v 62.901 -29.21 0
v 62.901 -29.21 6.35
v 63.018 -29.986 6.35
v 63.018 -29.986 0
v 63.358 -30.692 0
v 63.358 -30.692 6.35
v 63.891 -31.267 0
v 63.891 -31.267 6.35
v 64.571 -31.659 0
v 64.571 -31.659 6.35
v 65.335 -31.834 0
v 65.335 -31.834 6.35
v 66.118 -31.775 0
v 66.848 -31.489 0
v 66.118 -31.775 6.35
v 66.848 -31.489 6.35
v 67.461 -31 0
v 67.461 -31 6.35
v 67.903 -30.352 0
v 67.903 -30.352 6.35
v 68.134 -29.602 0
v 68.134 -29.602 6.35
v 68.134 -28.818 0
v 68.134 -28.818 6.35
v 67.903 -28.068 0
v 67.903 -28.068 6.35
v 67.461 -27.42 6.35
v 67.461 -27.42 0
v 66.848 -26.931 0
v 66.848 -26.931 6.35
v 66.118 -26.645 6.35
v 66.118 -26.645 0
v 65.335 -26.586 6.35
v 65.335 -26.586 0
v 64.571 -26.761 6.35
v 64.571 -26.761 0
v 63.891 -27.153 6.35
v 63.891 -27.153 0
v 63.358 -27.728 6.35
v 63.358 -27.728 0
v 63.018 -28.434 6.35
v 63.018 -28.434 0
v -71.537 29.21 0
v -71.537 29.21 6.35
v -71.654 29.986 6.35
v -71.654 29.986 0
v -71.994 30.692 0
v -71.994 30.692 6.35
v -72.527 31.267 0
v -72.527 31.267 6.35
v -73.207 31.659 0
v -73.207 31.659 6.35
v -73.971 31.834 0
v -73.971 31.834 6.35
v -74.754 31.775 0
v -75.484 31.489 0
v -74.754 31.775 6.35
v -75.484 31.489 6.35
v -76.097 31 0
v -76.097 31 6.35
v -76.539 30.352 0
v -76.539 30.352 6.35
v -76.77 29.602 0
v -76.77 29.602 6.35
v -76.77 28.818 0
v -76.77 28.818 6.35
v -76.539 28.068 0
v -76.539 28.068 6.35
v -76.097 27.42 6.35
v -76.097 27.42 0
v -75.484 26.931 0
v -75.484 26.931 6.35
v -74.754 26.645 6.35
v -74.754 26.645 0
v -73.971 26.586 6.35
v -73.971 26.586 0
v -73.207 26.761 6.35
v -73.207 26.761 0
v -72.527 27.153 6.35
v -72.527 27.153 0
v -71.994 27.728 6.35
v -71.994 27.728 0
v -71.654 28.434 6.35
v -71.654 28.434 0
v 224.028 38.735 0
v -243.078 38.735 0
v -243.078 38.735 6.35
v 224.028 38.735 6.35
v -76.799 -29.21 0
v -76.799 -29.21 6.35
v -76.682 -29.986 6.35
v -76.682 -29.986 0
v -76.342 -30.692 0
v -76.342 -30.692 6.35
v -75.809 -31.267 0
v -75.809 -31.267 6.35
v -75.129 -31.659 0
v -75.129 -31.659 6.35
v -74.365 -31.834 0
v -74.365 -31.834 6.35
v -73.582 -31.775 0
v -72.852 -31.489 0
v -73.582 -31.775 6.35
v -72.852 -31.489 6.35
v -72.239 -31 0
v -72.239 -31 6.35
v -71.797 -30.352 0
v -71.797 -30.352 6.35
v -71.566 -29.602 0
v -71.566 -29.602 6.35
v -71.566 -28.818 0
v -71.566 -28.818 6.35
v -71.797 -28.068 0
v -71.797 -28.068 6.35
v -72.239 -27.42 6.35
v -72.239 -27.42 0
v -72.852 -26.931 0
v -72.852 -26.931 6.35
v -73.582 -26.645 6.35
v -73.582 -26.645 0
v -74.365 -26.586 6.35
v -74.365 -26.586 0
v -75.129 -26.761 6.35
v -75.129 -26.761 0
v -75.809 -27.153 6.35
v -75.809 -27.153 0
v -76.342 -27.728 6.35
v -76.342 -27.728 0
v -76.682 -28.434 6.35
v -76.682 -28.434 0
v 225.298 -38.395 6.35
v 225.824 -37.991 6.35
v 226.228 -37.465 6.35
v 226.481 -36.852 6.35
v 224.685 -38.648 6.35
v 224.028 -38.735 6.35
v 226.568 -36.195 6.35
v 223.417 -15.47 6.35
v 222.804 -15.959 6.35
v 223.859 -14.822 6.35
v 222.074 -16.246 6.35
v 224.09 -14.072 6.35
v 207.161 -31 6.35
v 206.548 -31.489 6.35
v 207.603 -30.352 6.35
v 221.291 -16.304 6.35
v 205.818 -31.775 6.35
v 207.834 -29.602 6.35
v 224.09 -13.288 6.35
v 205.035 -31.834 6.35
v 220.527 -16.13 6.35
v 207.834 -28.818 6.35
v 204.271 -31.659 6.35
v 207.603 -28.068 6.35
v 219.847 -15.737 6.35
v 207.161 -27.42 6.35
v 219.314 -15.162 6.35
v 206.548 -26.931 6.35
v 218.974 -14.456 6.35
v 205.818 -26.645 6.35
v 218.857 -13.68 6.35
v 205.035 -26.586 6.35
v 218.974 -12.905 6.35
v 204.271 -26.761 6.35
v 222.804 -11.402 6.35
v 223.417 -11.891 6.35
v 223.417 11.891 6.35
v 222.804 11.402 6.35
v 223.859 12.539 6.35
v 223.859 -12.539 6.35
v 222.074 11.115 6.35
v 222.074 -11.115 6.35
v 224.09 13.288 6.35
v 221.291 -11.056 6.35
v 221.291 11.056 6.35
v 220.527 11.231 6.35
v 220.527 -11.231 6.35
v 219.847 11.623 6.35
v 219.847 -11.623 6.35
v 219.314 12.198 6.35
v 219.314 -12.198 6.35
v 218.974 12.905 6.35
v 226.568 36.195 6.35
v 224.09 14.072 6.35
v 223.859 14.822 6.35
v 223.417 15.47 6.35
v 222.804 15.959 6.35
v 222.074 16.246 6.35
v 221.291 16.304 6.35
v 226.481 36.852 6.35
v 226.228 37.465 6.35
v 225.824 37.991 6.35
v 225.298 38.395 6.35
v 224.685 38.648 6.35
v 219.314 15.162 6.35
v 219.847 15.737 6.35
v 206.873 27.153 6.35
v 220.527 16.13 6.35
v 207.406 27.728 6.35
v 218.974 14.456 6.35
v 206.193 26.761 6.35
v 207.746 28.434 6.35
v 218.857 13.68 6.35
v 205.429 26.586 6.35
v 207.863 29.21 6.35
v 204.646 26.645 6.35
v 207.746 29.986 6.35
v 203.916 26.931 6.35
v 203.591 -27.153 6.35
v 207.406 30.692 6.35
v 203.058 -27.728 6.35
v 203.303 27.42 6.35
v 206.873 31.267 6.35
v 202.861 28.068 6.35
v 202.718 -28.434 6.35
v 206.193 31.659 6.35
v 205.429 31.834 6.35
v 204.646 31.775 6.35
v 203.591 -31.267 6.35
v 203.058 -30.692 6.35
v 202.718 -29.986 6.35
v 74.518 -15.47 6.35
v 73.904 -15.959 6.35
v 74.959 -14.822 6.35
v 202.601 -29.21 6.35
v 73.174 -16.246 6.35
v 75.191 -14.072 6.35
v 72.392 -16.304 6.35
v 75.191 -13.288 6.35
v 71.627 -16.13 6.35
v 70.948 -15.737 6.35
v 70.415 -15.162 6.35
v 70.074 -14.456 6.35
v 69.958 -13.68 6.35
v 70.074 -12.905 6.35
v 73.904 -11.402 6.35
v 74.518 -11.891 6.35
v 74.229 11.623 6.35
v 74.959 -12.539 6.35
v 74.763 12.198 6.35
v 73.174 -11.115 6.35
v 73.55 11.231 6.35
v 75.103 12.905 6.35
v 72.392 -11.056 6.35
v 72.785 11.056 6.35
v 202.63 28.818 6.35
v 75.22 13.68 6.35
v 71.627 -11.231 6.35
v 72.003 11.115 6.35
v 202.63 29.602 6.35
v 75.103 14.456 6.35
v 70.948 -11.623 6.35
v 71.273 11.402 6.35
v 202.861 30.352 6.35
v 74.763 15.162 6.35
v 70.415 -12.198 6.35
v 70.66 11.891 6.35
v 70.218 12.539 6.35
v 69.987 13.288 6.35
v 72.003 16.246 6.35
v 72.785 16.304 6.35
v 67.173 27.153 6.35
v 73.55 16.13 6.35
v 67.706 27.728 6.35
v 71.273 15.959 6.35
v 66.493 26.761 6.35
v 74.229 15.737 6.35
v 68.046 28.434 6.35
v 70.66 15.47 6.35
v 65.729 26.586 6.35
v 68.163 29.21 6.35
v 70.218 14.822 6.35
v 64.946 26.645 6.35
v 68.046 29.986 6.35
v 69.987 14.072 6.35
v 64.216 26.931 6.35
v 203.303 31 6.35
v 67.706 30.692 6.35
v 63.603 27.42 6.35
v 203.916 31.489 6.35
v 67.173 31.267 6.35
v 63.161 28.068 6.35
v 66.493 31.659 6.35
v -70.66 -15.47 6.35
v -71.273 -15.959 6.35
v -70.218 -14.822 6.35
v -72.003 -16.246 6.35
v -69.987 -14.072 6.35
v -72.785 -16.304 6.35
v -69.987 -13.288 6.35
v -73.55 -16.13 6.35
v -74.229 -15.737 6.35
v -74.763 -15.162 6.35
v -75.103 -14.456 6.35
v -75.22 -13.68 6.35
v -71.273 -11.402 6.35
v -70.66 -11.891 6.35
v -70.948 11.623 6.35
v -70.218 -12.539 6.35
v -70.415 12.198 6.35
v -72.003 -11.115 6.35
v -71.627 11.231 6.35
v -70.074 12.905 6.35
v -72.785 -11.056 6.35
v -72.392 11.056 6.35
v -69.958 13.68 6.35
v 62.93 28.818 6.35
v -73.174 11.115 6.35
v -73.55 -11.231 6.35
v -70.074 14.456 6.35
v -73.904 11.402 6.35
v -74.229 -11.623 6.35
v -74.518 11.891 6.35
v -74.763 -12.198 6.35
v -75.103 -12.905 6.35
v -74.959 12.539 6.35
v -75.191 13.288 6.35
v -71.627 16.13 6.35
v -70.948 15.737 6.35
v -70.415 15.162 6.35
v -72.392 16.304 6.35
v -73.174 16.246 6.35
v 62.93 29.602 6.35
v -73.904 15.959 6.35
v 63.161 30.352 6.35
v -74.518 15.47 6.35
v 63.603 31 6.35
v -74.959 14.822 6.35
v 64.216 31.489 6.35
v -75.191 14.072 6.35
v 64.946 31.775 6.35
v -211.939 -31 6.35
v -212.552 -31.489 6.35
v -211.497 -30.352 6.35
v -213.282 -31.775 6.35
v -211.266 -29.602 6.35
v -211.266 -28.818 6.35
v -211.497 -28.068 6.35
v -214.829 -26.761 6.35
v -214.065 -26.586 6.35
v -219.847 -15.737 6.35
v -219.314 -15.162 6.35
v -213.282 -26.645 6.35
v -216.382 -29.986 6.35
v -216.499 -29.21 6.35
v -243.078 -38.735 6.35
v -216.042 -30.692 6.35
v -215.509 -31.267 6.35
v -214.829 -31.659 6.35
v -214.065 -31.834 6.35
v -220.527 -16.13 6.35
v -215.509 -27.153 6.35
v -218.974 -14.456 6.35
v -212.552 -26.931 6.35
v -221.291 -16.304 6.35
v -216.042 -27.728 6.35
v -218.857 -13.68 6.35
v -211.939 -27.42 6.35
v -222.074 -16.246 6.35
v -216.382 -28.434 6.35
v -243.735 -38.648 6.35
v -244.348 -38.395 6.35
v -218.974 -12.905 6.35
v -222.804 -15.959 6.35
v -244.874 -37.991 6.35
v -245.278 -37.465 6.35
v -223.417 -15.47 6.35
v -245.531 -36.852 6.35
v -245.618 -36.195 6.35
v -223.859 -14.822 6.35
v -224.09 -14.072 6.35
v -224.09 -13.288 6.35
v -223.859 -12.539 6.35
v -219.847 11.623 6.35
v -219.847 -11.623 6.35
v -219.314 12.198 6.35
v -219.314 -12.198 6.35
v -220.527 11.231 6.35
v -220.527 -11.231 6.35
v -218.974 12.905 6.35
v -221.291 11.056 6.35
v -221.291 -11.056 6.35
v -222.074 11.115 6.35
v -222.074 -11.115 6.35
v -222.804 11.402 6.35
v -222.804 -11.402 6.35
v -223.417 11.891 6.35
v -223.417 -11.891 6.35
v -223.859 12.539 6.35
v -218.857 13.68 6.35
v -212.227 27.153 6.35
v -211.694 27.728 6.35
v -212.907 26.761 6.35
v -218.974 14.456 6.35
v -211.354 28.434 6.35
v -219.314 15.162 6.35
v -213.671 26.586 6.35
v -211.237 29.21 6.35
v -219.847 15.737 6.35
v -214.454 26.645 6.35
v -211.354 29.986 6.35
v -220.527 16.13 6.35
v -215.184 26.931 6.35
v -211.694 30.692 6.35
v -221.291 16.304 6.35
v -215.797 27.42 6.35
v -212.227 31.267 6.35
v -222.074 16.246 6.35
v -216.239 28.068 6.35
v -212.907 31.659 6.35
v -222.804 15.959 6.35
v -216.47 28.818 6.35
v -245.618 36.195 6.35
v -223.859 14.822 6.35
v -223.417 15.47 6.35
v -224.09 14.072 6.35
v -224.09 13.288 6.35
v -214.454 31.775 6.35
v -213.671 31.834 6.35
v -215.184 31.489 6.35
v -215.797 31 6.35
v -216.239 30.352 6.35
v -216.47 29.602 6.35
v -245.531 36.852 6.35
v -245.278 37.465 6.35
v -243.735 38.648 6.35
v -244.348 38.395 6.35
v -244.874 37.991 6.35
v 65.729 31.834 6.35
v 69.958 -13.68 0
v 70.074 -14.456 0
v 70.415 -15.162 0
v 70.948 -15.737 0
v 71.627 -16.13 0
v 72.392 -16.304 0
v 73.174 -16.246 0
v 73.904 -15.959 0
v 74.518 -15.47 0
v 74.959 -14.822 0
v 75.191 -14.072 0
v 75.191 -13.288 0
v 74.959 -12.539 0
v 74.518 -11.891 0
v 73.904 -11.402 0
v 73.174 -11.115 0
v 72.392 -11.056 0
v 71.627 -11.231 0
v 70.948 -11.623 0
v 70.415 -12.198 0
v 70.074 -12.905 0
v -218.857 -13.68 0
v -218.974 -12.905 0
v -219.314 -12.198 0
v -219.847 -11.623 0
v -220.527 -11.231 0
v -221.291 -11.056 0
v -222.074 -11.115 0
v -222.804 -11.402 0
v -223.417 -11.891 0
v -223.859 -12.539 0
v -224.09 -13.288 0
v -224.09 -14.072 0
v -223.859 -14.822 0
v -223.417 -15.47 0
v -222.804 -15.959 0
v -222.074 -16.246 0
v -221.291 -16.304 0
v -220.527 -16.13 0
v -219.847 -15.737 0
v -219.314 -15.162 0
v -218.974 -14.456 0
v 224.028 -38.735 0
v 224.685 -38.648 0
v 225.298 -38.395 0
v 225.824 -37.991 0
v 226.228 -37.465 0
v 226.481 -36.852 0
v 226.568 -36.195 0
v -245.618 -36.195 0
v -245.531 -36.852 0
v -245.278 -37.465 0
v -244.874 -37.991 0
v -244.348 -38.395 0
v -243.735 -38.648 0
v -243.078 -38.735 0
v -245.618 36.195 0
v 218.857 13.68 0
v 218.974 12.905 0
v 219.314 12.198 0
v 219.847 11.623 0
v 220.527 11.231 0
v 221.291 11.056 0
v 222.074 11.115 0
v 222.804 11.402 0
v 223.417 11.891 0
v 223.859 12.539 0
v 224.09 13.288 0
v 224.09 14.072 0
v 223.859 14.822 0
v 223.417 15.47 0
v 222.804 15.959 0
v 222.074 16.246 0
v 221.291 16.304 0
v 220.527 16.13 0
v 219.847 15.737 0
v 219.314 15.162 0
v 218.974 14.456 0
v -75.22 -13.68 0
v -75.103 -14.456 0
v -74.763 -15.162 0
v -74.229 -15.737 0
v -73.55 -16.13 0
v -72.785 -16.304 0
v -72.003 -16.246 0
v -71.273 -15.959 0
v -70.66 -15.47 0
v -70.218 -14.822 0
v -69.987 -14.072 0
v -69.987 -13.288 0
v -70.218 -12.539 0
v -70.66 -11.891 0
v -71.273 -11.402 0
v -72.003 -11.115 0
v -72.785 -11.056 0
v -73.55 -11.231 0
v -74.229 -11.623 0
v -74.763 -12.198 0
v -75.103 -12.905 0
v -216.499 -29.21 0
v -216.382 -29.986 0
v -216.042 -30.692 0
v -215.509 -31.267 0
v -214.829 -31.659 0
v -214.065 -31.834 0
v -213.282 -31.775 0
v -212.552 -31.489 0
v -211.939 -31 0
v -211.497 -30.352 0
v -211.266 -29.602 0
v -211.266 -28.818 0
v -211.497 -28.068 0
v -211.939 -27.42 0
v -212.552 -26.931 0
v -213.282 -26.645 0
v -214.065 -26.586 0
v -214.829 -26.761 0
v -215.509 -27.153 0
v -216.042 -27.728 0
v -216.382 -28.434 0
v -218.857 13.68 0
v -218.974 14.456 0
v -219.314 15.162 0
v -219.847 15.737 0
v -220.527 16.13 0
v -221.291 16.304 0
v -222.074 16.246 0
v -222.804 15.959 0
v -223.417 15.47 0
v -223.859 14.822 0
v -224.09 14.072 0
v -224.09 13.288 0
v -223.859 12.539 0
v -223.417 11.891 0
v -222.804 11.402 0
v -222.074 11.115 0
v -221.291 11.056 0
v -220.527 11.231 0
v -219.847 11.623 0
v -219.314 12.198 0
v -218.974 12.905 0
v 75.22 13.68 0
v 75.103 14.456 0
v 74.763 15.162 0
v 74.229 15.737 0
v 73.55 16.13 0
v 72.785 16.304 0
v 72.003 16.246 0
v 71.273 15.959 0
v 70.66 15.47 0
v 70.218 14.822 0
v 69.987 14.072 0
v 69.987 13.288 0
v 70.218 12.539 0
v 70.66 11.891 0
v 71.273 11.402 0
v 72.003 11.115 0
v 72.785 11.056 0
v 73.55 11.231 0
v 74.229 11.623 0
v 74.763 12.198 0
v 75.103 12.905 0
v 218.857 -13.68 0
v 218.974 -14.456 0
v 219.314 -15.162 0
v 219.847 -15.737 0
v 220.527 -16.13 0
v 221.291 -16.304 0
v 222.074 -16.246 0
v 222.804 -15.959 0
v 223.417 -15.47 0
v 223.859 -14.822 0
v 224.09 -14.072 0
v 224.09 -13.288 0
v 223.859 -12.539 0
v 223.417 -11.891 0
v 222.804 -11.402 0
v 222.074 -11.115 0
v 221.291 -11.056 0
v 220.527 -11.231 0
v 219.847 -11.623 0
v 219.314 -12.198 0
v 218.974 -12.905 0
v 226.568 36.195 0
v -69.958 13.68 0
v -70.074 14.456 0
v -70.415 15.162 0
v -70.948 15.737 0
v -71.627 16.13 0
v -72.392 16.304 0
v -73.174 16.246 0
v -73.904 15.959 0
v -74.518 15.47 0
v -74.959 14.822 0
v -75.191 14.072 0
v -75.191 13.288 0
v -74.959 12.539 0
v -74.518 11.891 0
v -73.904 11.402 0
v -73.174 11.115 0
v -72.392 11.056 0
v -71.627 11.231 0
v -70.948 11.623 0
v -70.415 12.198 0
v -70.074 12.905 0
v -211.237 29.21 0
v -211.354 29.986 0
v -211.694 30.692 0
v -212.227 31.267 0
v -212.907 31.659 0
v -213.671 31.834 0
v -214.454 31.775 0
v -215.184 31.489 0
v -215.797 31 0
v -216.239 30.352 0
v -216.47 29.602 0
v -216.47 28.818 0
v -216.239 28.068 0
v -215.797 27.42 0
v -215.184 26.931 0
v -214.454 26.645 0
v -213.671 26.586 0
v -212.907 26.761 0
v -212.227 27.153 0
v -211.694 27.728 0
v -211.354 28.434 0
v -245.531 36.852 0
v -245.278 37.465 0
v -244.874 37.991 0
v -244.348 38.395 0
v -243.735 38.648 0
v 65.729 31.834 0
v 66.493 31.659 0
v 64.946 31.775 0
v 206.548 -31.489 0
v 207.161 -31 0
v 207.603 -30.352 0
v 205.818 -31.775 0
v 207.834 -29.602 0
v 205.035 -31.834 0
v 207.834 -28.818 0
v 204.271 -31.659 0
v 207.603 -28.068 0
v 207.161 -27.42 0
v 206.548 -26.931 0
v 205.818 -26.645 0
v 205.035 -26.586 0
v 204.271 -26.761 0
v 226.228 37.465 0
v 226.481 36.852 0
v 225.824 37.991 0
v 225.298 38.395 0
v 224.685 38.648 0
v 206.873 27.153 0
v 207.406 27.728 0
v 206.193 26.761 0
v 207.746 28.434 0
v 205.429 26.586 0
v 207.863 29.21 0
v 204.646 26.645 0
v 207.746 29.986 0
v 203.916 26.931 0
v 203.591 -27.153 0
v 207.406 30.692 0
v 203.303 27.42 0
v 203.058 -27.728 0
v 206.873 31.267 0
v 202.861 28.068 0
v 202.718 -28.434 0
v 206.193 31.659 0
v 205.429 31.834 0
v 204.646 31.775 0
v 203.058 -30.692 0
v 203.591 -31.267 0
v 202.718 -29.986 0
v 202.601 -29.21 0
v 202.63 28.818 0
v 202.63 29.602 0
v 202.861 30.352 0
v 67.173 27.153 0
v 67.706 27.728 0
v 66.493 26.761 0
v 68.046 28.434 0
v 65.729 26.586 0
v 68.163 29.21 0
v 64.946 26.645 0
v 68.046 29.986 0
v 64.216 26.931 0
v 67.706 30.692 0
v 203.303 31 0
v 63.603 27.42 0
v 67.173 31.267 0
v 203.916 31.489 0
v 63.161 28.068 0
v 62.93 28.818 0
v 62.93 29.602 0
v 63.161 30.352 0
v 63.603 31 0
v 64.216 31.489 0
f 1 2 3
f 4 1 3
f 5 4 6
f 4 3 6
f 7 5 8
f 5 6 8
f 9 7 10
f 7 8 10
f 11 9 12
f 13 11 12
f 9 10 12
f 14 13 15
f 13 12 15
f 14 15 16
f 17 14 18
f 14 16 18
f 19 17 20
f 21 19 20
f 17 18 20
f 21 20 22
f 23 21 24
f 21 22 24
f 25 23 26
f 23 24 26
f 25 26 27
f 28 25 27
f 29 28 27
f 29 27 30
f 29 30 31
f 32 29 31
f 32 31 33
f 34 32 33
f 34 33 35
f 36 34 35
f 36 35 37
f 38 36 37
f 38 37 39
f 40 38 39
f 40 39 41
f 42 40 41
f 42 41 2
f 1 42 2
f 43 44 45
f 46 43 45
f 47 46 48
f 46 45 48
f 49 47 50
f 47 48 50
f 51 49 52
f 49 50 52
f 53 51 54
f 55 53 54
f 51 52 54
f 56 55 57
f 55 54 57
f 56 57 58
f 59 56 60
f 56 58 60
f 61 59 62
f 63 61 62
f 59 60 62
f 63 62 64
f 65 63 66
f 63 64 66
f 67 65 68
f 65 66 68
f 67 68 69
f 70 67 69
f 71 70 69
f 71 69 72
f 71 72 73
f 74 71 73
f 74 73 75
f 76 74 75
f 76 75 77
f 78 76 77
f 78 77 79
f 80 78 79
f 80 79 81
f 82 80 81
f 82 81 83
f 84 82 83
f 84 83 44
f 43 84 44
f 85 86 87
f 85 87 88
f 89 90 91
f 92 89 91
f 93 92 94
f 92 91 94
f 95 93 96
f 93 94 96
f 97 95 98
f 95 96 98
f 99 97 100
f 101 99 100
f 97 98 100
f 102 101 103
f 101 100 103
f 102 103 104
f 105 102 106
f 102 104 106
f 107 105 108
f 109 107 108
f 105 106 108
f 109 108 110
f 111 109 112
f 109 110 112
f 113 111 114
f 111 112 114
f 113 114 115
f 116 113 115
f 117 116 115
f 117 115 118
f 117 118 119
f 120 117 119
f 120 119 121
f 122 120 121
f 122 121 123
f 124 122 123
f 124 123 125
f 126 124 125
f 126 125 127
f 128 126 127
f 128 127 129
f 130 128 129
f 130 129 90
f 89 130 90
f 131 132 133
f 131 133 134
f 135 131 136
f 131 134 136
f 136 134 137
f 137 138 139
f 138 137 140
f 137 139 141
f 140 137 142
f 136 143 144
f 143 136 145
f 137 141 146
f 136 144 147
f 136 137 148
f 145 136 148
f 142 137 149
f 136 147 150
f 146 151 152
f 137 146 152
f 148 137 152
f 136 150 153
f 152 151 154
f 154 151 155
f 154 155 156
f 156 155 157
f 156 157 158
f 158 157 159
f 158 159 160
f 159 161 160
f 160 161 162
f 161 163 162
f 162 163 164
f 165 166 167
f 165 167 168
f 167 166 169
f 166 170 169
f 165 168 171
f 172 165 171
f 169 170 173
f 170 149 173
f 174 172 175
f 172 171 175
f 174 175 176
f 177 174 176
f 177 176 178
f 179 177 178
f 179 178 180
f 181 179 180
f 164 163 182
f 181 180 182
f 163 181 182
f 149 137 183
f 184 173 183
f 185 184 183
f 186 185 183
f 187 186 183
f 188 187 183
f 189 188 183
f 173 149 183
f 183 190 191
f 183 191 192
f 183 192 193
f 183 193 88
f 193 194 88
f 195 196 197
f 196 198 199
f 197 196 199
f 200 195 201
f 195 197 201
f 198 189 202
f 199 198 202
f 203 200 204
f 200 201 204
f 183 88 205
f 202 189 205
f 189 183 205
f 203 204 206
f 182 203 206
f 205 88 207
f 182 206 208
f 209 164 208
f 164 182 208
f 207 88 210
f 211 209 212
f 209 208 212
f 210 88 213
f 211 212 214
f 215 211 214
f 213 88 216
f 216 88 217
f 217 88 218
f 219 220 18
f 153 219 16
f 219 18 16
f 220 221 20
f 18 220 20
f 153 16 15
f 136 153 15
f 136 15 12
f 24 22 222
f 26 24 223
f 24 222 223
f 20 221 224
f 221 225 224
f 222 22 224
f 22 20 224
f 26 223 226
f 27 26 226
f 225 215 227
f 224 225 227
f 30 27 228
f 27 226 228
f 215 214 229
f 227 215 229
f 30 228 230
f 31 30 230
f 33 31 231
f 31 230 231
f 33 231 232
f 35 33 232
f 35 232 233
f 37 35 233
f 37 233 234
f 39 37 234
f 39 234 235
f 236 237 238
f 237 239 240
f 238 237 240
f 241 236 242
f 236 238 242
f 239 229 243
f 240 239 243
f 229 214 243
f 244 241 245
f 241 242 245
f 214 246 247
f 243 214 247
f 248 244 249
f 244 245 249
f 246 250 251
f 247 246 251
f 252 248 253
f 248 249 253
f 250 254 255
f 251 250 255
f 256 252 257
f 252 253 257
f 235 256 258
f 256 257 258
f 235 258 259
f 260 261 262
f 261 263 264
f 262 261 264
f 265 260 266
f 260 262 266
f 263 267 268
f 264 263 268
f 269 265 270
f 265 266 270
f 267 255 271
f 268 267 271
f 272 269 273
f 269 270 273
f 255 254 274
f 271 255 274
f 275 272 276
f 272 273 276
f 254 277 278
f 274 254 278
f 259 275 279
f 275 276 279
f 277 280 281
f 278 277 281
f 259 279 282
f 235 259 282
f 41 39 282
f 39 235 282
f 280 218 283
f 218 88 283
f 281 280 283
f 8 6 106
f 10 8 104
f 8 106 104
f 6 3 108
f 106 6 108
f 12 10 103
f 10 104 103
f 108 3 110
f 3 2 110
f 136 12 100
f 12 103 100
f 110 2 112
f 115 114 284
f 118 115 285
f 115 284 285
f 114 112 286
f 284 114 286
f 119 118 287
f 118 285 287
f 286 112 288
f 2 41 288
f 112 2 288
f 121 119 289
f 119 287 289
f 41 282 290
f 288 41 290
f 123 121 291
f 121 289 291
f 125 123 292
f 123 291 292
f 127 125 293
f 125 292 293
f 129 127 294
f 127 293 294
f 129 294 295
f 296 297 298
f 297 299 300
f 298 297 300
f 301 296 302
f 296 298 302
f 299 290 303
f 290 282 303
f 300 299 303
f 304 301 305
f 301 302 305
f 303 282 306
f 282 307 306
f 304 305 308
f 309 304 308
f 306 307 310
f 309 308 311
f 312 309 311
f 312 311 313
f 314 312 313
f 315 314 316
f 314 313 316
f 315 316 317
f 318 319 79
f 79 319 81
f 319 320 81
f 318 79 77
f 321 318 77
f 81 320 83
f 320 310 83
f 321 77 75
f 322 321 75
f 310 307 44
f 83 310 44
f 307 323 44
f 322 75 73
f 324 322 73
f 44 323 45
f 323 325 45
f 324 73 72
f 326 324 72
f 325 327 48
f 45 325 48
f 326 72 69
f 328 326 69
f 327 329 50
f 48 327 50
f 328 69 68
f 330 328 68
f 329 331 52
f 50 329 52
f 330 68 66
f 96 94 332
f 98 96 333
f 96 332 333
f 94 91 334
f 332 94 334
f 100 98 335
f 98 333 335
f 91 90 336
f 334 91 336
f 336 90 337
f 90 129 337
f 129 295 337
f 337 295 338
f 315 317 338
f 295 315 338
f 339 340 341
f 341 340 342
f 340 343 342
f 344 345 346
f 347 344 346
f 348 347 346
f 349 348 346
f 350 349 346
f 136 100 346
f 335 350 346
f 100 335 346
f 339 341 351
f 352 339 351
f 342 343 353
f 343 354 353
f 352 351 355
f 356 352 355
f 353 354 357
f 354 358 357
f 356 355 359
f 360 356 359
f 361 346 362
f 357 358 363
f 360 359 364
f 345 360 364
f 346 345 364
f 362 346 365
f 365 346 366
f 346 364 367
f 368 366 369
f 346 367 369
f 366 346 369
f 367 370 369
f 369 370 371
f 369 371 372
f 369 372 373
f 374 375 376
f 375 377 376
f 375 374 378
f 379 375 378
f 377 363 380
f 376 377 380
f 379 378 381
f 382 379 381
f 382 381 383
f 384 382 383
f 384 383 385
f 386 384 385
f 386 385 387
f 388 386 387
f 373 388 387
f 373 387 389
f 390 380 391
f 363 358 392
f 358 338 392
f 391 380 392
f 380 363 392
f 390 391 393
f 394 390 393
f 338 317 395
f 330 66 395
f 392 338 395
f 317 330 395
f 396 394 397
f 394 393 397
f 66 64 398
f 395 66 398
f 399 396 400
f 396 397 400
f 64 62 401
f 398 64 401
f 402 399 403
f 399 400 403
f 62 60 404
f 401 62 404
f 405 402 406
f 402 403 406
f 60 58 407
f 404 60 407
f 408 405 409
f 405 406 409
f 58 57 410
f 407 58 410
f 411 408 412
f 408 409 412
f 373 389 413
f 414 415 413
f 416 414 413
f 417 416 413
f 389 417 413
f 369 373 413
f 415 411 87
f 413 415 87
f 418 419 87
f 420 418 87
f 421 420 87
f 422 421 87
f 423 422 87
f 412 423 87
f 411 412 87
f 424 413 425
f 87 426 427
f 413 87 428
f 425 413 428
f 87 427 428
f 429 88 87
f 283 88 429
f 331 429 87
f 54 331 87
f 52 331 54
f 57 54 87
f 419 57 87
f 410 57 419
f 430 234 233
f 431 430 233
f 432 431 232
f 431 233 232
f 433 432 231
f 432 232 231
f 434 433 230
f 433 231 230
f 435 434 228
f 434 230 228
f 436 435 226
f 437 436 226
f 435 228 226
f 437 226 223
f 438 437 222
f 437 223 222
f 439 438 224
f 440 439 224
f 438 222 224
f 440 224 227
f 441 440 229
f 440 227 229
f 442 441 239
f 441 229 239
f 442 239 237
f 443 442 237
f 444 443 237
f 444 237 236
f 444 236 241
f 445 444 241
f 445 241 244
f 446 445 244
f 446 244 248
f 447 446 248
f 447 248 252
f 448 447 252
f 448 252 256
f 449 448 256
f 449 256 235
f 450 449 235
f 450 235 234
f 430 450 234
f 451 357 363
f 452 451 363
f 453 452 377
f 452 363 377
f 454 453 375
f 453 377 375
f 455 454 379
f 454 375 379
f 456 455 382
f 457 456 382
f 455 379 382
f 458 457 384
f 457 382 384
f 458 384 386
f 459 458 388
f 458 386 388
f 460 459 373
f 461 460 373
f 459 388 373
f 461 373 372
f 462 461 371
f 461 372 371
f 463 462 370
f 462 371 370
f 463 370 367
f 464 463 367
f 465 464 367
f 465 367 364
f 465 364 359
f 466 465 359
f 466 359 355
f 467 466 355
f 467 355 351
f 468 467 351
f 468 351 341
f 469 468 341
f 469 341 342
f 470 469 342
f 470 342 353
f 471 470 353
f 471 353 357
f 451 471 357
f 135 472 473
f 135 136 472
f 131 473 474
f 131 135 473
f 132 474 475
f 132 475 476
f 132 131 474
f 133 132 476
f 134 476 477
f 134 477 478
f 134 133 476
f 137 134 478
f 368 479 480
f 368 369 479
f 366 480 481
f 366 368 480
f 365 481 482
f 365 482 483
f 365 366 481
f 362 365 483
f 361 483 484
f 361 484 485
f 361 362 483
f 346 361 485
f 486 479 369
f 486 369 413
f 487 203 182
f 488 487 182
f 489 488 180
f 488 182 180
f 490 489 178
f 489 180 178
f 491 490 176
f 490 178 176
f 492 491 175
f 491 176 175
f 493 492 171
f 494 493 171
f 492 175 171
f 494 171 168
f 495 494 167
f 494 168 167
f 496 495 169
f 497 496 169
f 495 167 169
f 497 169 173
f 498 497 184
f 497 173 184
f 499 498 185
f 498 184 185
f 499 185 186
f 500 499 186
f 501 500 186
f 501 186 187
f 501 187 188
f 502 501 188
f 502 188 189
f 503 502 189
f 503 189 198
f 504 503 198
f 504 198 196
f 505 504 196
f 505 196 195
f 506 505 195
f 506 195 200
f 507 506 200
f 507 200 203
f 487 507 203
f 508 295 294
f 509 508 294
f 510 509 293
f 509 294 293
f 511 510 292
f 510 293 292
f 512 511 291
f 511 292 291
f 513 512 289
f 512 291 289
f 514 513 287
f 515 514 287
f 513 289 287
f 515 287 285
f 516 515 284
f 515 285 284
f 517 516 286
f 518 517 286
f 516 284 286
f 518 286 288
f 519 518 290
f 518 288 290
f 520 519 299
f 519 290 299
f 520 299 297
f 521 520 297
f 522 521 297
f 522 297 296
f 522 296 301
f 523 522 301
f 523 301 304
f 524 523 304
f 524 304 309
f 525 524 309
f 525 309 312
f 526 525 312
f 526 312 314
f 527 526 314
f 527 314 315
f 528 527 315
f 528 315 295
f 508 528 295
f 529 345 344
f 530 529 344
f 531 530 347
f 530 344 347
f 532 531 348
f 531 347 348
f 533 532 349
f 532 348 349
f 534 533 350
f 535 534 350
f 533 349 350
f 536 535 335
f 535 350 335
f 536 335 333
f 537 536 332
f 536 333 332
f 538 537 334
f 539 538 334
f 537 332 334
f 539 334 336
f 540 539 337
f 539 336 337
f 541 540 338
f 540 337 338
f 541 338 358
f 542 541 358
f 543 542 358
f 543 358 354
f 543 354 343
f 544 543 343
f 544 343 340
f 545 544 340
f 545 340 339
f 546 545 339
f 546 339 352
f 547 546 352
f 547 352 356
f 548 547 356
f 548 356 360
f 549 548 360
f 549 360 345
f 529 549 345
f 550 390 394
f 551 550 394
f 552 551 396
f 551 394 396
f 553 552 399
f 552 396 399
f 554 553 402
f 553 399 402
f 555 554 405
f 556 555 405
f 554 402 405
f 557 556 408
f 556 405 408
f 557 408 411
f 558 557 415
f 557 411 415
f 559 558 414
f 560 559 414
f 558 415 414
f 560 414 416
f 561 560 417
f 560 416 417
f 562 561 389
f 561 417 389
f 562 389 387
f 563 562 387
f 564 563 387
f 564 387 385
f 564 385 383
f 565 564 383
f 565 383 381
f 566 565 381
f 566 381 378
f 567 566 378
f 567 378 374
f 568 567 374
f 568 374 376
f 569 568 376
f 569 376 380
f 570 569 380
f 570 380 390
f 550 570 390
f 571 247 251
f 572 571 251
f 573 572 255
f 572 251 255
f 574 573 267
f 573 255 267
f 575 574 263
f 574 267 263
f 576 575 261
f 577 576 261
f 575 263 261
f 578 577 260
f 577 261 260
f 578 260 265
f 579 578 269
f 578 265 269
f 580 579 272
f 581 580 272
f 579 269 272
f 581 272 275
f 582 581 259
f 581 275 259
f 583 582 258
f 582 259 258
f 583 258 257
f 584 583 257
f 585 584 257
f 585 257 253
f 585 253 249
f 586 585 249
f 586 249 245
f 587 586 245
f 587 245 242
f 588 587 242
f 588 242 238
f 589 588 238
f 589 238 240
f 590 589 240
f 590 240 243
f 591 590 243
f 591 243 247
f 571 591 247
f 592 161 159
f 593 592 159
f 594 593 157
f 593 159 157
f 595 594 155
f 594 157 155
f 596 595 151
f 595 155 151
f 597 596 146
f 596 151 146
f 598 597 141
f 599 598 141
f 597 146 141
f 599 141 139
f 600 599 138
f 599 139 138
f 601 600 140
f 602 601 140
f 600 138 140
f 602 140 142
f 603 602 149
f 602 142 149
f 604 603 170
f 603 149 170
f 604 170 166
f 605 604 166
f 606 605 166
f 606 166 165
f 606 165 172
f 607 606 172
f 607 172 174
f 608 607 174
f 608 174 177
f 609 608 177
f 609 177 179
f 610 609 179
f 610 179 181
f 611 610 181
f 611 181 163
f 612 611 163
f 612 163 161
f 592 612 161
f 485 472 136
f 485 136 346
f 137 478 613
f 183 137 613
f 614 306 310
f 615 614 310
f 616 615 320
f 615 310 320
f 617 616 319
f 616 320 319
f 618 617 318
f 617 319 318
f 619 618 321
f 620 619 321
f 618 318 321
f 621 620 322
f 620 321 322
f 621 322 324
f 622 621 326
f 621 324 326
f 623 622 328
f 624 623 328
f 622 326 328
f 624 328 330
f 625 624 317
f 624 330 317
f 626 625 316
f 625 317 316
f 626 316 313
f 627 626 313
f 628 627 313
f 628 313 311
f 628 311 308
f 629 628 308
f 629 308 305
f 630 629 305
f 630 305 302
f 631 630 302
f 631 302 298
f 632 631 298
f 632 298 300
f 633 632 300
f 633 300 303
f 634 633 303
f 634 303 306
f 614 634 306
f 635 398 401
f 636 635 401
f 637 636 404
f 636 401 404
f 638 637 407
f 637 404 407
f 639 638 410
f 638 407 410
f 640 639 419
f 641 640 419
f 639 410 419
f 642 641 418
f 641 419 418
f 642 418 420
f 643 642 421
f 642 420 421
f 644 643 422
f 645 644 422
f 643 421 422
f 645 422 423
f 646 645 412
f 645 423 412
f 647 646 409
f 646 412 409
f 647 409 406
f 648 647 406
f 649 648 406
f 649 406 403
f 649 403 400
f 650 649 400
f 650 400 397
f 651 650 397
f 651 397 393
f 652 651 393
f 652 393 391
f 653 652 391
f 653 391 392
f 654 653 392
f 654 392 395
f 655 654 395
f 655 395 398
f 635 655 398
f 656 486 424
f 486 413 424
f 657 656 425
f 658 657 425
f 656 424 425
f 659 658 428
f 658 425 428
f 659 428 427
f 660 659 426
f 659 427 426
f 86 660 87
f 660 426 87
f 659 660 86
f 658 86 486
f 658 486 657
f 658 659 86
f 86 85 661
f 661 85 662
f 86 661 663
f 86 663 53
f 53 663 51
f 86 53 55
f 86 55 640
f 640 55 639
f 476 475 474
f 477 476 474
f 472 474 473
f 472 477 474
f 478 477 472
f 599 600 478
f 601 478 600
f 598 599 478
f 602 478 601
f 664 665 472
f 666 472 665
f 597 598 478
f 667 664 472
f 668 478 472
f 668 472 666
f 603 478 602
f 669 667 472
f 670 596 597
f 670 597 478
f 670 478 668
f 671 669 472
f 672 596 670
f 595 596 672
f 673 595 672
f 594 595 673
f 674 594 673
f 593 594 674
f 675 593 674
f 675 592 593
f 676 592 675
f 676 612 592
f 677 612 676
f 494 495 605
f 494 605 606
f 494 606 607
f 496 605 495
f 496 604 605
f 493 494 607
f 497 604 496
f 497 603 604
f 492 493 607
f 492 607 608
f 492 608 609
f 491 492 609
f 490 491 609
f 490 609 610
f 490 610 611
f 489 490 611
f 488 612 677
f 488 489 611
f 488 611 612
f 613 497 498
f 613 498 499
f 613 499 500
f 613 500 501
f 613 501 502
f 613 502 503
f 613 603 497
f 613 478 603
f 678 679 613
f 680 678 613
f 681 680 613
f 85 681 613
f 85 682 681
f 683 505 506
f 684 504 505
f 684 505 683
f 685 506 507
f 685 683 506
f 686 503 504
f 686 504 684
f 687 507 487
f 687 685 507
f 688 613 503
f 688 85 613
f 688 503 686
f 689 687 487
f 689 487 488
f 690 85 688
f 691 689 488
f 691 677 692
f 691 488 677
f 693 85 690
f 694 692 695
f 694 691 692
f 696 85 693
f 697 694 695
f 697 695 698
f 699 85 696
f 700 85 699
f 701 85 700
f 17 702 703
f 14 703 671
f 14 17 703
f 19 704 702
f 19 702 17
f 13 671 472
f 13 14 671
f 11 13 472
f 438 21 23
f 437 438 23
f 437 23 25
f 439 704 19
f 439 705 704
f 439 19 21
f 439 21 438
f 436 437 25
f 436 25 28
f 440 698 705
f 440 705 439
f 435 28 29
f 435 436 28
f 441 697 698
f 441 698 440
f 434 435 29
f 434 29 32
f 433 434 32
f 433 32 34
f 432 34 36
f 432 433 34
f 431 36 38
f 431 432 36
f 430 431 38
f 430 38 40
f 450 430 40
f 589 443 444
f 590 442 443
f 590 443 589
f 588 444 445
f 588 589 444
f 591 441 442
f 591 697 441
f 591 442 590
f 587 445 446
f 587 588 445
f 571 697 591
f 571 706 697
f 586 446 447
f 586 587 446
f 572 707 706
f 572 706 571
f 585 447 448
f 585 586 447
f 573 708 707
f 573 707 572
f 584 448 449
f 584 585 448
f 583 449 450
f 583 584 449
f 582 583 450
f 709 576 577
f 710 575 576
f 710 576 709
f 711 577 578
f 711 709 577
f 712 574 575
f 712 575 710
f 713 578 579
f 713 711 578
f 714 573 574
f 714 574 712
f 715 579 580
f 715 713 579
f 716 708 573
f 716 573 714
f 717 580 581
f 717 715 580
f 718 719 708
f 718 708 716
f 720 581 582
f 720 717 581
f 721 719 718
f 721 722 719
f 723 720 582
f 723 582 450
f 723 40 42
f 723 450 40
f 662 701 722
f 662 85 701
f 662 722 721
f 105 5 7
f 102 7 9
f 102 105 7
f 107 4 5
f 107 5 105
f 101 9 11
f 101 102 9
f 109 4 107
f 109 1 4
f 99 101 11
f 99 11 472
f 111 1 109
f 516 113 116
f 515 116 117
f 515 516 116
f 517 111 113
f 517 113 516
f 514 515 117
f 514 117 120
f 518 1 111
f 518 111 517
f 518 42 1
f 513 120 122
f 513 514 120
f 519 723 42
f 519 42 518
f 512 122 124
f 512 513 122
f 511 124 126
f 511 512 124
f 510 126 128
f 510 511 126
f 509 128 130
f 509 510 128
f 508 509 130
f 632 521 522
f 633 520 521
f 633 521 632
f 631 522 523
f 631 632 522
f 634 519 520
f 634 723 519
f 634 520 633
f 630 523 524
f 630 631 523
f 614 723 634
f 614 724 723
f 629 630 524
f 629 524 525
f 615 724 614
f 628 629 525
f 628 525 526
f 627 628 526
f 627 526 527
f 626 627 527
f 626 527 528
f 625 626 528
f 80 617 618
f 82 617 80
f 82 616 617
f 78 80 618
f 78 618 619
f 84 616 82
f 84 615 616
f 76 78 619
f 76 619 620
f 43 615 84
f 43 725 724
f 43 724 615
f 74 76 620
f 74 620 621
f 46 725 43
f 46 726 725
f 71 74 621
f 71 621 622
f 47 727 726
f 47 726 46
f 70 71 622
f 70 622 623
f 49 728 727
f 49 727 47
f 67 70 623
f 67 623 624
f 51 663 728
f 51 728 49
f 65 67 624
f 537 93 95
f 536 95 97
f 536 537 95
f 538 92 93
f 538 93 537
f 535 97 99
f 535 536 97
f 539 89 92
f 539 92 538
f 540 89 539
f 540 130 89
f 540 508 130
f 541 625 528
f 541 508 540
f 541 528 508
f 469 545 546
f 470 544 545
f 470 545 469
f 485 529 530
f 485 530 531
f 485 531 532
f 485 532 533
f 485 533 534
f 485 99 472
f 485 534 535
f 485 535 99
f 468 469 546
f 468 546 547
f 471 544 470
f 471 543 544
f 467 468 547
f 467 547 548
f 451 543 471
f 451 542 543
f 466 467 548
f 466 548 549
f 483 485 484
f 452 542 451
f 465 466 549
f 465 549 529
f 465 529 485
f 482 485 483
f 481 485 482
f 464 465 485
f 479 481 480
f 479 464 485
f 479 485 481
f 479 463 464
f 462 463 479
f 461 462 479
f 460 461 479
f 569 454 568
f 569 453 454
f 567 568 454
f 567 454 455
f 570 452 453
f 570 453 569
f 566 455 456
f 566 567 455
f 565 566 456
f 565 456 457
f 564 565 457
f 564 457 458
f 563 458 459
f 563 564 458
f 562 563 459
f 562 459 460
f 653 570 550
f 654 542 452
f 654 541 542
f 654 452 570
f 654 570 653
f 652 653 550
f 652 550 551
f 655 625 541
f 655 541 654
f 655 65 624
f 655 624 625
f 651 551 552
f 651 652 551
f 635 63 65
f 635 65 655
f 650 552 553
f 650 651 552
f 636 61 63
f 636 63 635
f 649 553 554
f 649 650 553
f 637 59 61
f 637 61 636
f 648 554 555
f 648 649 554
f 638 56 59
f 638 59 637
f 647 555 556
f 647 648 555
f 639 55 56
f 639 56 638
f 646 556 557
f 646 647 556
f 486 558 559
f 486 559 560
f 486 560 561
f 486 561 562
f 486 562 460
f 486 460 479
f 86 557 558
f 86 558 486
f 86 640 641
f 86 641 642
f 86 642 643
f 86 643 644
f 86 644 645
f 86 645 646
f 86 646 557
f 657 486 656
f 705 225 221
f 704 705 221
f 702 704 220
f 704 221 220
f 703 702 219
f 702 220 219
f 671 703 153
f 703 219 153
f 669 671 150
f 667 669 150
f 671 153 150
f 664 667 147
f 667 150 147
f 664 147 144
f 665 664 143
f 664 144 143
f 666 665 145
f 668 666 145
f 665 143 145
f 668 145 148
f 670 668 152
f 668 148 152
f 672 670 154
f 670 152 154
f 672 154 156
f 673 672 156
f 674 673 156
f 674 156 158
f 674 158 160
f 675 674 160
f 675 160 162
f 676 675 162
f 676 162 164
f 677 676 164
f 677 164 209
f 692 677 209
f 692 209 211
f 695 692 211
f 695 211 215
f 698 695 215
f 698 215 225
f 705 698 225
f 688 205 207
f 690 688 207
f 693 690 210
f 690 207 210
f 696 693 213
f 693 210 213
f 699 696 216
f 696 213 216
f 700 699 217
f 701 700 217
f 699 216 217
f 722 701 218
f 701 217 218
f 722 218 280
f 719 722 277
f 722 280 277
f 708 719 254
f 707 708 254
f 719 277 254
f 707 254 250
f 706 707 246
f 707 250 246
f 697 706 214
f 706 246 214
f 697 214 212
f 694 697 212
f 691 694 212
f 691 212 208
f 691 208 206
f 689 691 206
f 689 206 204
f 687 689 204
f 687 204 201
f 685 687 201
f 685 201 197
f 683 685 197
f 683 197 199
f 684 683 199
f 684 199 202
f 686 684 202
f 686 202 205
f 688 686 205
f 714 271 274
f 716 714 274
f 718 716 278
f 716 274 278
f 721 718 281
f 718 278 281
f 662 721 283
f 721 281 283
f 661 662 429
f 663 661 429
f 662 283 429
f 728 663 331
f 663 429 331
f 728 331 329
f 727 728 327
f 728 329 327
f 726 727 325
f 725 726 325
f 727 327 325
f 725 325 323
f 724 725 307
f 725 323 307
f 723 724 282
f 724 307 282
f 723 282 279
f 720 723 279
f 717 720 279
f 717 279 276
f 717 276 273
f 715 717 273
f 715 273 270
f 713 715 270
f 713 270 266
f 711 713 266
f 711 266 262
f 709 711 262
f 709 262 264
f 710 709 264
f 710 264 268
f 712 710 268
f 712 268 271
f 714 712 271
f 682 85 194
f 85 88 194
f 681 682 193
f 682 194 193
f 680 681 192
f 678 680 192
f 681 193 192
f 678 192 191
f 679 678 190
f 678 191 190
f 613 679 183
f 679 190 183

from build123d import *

# Parameters (mm, degrees)
SALIENTE_EXTRUIR1_DEPTH = 6.35
CROQUIS4_R              = 2.63125
CORTAR_EXTRUIR2_DEPTH   = 249.734647062
CROQUIS5_R              = 2.63125
CORTAR_EXTRUIR3_DEPTH   = 249.734647062
REDONDEO1_R             = 2.54


with BuildPart() as part:
    # Croquis2 → Saliente-Extruir1 (new body)
    with BuildSketch(Plane.XY):
        Polygon((-245.618, -38.735), (-245.618, 38.735), (226.568, 38.735), (226.568, 19.685), (226.568, -19.685), (226.568, -38.735), align=None)
    extrude(amount=SALIENTE_EXTRUIR1_DEPTH)

    # Croquis4 → Cortar-Extruir2 (cut, through all)
    with BuildSketch(Plane.XY.offset(6.35)):
        with Locations((-221.488, 13.68025)):
            Circle(CROQUIS4_R)
        with Locations((-221.488, -13.68025)):
            Circle(CROQUIS4_R)
        with Locations(Location((221.488, -13.68025, 0), (0, 0, 180))):
            Circle(CROQUIS4_R)
        with Locations(Location((221.488, 13.68025, 0), (0, 0, 180))):
            Circle(CROQUIS4_R)
        with Locations((-72.588782178, 13.68025)):
            Circle(CROQUIS4_R)
        with Locations(Location((-72.588782178, -13.68025, 0), (0, 0, 180))):
            Circle(CROQUIS4_R)
        with Locations((72.588782178, 13.68025)):
            Circle(CROQUIS4_R)
        with Locations(Location((72.588782178, -13.68025, 0), (0, 0, 180))):
            Circle(CROQUIS4_R)
    extrude(amount=-CORTAR_EXTRUIR2_DEPTH, mode=Mode.SUBTRACT)

    # Croquis5 → Cortar-Extruir3 (cut, through all)
    with BuildSketch(Plane.XY.offset(6.35)):
        with Locations((-213.868, 29.21)):
            Circle(CROQUIS5_R)
        with Locations((-74.168, 29.21)):
            Circle(CROQUIS5_R)
        with Locations((65.532, 29.21)):
            Circle(CROQUIS5_R)
        with Locations((205.232, 29.21)):
            Circle(CROQUIS5_R)
        with Locations(Location((205.232, -29.21, 0), (0, 0, 180))):
            Circle(CROQUIS5_R)
        with Locations(Location((65.532, -29.21, 0), (0, 0, 180))):
            Circle(CROQUIS5_R)
        with Locations(Location((-74.168, -29.21, 0), (0, 0, 180))):
            Circle(CROQUIS5_R)
        with Locations(Location((-213.868, -29.21, 0), (0, 0, 180))):
            Circle(CROQUIS5_R)
    extrude(amount=-CORTAR_EXTRUIR3_DEPTH, mode=Mode.SUBTRACT)

    # Redondeo1
    redondeo1_edges = [part.edges().sort_by_distance(p)[0] for p in [
        (226.568, -38.735, 3.175),
        (-245.618, -38.735, 3.175),
        (-245.618, 38.735, 3.175),
        (226.568, 38.735, 3.175),
    ]]
    fillet(redondeo1_edges, radius=REDONDEO1_R)


solid = part.part
